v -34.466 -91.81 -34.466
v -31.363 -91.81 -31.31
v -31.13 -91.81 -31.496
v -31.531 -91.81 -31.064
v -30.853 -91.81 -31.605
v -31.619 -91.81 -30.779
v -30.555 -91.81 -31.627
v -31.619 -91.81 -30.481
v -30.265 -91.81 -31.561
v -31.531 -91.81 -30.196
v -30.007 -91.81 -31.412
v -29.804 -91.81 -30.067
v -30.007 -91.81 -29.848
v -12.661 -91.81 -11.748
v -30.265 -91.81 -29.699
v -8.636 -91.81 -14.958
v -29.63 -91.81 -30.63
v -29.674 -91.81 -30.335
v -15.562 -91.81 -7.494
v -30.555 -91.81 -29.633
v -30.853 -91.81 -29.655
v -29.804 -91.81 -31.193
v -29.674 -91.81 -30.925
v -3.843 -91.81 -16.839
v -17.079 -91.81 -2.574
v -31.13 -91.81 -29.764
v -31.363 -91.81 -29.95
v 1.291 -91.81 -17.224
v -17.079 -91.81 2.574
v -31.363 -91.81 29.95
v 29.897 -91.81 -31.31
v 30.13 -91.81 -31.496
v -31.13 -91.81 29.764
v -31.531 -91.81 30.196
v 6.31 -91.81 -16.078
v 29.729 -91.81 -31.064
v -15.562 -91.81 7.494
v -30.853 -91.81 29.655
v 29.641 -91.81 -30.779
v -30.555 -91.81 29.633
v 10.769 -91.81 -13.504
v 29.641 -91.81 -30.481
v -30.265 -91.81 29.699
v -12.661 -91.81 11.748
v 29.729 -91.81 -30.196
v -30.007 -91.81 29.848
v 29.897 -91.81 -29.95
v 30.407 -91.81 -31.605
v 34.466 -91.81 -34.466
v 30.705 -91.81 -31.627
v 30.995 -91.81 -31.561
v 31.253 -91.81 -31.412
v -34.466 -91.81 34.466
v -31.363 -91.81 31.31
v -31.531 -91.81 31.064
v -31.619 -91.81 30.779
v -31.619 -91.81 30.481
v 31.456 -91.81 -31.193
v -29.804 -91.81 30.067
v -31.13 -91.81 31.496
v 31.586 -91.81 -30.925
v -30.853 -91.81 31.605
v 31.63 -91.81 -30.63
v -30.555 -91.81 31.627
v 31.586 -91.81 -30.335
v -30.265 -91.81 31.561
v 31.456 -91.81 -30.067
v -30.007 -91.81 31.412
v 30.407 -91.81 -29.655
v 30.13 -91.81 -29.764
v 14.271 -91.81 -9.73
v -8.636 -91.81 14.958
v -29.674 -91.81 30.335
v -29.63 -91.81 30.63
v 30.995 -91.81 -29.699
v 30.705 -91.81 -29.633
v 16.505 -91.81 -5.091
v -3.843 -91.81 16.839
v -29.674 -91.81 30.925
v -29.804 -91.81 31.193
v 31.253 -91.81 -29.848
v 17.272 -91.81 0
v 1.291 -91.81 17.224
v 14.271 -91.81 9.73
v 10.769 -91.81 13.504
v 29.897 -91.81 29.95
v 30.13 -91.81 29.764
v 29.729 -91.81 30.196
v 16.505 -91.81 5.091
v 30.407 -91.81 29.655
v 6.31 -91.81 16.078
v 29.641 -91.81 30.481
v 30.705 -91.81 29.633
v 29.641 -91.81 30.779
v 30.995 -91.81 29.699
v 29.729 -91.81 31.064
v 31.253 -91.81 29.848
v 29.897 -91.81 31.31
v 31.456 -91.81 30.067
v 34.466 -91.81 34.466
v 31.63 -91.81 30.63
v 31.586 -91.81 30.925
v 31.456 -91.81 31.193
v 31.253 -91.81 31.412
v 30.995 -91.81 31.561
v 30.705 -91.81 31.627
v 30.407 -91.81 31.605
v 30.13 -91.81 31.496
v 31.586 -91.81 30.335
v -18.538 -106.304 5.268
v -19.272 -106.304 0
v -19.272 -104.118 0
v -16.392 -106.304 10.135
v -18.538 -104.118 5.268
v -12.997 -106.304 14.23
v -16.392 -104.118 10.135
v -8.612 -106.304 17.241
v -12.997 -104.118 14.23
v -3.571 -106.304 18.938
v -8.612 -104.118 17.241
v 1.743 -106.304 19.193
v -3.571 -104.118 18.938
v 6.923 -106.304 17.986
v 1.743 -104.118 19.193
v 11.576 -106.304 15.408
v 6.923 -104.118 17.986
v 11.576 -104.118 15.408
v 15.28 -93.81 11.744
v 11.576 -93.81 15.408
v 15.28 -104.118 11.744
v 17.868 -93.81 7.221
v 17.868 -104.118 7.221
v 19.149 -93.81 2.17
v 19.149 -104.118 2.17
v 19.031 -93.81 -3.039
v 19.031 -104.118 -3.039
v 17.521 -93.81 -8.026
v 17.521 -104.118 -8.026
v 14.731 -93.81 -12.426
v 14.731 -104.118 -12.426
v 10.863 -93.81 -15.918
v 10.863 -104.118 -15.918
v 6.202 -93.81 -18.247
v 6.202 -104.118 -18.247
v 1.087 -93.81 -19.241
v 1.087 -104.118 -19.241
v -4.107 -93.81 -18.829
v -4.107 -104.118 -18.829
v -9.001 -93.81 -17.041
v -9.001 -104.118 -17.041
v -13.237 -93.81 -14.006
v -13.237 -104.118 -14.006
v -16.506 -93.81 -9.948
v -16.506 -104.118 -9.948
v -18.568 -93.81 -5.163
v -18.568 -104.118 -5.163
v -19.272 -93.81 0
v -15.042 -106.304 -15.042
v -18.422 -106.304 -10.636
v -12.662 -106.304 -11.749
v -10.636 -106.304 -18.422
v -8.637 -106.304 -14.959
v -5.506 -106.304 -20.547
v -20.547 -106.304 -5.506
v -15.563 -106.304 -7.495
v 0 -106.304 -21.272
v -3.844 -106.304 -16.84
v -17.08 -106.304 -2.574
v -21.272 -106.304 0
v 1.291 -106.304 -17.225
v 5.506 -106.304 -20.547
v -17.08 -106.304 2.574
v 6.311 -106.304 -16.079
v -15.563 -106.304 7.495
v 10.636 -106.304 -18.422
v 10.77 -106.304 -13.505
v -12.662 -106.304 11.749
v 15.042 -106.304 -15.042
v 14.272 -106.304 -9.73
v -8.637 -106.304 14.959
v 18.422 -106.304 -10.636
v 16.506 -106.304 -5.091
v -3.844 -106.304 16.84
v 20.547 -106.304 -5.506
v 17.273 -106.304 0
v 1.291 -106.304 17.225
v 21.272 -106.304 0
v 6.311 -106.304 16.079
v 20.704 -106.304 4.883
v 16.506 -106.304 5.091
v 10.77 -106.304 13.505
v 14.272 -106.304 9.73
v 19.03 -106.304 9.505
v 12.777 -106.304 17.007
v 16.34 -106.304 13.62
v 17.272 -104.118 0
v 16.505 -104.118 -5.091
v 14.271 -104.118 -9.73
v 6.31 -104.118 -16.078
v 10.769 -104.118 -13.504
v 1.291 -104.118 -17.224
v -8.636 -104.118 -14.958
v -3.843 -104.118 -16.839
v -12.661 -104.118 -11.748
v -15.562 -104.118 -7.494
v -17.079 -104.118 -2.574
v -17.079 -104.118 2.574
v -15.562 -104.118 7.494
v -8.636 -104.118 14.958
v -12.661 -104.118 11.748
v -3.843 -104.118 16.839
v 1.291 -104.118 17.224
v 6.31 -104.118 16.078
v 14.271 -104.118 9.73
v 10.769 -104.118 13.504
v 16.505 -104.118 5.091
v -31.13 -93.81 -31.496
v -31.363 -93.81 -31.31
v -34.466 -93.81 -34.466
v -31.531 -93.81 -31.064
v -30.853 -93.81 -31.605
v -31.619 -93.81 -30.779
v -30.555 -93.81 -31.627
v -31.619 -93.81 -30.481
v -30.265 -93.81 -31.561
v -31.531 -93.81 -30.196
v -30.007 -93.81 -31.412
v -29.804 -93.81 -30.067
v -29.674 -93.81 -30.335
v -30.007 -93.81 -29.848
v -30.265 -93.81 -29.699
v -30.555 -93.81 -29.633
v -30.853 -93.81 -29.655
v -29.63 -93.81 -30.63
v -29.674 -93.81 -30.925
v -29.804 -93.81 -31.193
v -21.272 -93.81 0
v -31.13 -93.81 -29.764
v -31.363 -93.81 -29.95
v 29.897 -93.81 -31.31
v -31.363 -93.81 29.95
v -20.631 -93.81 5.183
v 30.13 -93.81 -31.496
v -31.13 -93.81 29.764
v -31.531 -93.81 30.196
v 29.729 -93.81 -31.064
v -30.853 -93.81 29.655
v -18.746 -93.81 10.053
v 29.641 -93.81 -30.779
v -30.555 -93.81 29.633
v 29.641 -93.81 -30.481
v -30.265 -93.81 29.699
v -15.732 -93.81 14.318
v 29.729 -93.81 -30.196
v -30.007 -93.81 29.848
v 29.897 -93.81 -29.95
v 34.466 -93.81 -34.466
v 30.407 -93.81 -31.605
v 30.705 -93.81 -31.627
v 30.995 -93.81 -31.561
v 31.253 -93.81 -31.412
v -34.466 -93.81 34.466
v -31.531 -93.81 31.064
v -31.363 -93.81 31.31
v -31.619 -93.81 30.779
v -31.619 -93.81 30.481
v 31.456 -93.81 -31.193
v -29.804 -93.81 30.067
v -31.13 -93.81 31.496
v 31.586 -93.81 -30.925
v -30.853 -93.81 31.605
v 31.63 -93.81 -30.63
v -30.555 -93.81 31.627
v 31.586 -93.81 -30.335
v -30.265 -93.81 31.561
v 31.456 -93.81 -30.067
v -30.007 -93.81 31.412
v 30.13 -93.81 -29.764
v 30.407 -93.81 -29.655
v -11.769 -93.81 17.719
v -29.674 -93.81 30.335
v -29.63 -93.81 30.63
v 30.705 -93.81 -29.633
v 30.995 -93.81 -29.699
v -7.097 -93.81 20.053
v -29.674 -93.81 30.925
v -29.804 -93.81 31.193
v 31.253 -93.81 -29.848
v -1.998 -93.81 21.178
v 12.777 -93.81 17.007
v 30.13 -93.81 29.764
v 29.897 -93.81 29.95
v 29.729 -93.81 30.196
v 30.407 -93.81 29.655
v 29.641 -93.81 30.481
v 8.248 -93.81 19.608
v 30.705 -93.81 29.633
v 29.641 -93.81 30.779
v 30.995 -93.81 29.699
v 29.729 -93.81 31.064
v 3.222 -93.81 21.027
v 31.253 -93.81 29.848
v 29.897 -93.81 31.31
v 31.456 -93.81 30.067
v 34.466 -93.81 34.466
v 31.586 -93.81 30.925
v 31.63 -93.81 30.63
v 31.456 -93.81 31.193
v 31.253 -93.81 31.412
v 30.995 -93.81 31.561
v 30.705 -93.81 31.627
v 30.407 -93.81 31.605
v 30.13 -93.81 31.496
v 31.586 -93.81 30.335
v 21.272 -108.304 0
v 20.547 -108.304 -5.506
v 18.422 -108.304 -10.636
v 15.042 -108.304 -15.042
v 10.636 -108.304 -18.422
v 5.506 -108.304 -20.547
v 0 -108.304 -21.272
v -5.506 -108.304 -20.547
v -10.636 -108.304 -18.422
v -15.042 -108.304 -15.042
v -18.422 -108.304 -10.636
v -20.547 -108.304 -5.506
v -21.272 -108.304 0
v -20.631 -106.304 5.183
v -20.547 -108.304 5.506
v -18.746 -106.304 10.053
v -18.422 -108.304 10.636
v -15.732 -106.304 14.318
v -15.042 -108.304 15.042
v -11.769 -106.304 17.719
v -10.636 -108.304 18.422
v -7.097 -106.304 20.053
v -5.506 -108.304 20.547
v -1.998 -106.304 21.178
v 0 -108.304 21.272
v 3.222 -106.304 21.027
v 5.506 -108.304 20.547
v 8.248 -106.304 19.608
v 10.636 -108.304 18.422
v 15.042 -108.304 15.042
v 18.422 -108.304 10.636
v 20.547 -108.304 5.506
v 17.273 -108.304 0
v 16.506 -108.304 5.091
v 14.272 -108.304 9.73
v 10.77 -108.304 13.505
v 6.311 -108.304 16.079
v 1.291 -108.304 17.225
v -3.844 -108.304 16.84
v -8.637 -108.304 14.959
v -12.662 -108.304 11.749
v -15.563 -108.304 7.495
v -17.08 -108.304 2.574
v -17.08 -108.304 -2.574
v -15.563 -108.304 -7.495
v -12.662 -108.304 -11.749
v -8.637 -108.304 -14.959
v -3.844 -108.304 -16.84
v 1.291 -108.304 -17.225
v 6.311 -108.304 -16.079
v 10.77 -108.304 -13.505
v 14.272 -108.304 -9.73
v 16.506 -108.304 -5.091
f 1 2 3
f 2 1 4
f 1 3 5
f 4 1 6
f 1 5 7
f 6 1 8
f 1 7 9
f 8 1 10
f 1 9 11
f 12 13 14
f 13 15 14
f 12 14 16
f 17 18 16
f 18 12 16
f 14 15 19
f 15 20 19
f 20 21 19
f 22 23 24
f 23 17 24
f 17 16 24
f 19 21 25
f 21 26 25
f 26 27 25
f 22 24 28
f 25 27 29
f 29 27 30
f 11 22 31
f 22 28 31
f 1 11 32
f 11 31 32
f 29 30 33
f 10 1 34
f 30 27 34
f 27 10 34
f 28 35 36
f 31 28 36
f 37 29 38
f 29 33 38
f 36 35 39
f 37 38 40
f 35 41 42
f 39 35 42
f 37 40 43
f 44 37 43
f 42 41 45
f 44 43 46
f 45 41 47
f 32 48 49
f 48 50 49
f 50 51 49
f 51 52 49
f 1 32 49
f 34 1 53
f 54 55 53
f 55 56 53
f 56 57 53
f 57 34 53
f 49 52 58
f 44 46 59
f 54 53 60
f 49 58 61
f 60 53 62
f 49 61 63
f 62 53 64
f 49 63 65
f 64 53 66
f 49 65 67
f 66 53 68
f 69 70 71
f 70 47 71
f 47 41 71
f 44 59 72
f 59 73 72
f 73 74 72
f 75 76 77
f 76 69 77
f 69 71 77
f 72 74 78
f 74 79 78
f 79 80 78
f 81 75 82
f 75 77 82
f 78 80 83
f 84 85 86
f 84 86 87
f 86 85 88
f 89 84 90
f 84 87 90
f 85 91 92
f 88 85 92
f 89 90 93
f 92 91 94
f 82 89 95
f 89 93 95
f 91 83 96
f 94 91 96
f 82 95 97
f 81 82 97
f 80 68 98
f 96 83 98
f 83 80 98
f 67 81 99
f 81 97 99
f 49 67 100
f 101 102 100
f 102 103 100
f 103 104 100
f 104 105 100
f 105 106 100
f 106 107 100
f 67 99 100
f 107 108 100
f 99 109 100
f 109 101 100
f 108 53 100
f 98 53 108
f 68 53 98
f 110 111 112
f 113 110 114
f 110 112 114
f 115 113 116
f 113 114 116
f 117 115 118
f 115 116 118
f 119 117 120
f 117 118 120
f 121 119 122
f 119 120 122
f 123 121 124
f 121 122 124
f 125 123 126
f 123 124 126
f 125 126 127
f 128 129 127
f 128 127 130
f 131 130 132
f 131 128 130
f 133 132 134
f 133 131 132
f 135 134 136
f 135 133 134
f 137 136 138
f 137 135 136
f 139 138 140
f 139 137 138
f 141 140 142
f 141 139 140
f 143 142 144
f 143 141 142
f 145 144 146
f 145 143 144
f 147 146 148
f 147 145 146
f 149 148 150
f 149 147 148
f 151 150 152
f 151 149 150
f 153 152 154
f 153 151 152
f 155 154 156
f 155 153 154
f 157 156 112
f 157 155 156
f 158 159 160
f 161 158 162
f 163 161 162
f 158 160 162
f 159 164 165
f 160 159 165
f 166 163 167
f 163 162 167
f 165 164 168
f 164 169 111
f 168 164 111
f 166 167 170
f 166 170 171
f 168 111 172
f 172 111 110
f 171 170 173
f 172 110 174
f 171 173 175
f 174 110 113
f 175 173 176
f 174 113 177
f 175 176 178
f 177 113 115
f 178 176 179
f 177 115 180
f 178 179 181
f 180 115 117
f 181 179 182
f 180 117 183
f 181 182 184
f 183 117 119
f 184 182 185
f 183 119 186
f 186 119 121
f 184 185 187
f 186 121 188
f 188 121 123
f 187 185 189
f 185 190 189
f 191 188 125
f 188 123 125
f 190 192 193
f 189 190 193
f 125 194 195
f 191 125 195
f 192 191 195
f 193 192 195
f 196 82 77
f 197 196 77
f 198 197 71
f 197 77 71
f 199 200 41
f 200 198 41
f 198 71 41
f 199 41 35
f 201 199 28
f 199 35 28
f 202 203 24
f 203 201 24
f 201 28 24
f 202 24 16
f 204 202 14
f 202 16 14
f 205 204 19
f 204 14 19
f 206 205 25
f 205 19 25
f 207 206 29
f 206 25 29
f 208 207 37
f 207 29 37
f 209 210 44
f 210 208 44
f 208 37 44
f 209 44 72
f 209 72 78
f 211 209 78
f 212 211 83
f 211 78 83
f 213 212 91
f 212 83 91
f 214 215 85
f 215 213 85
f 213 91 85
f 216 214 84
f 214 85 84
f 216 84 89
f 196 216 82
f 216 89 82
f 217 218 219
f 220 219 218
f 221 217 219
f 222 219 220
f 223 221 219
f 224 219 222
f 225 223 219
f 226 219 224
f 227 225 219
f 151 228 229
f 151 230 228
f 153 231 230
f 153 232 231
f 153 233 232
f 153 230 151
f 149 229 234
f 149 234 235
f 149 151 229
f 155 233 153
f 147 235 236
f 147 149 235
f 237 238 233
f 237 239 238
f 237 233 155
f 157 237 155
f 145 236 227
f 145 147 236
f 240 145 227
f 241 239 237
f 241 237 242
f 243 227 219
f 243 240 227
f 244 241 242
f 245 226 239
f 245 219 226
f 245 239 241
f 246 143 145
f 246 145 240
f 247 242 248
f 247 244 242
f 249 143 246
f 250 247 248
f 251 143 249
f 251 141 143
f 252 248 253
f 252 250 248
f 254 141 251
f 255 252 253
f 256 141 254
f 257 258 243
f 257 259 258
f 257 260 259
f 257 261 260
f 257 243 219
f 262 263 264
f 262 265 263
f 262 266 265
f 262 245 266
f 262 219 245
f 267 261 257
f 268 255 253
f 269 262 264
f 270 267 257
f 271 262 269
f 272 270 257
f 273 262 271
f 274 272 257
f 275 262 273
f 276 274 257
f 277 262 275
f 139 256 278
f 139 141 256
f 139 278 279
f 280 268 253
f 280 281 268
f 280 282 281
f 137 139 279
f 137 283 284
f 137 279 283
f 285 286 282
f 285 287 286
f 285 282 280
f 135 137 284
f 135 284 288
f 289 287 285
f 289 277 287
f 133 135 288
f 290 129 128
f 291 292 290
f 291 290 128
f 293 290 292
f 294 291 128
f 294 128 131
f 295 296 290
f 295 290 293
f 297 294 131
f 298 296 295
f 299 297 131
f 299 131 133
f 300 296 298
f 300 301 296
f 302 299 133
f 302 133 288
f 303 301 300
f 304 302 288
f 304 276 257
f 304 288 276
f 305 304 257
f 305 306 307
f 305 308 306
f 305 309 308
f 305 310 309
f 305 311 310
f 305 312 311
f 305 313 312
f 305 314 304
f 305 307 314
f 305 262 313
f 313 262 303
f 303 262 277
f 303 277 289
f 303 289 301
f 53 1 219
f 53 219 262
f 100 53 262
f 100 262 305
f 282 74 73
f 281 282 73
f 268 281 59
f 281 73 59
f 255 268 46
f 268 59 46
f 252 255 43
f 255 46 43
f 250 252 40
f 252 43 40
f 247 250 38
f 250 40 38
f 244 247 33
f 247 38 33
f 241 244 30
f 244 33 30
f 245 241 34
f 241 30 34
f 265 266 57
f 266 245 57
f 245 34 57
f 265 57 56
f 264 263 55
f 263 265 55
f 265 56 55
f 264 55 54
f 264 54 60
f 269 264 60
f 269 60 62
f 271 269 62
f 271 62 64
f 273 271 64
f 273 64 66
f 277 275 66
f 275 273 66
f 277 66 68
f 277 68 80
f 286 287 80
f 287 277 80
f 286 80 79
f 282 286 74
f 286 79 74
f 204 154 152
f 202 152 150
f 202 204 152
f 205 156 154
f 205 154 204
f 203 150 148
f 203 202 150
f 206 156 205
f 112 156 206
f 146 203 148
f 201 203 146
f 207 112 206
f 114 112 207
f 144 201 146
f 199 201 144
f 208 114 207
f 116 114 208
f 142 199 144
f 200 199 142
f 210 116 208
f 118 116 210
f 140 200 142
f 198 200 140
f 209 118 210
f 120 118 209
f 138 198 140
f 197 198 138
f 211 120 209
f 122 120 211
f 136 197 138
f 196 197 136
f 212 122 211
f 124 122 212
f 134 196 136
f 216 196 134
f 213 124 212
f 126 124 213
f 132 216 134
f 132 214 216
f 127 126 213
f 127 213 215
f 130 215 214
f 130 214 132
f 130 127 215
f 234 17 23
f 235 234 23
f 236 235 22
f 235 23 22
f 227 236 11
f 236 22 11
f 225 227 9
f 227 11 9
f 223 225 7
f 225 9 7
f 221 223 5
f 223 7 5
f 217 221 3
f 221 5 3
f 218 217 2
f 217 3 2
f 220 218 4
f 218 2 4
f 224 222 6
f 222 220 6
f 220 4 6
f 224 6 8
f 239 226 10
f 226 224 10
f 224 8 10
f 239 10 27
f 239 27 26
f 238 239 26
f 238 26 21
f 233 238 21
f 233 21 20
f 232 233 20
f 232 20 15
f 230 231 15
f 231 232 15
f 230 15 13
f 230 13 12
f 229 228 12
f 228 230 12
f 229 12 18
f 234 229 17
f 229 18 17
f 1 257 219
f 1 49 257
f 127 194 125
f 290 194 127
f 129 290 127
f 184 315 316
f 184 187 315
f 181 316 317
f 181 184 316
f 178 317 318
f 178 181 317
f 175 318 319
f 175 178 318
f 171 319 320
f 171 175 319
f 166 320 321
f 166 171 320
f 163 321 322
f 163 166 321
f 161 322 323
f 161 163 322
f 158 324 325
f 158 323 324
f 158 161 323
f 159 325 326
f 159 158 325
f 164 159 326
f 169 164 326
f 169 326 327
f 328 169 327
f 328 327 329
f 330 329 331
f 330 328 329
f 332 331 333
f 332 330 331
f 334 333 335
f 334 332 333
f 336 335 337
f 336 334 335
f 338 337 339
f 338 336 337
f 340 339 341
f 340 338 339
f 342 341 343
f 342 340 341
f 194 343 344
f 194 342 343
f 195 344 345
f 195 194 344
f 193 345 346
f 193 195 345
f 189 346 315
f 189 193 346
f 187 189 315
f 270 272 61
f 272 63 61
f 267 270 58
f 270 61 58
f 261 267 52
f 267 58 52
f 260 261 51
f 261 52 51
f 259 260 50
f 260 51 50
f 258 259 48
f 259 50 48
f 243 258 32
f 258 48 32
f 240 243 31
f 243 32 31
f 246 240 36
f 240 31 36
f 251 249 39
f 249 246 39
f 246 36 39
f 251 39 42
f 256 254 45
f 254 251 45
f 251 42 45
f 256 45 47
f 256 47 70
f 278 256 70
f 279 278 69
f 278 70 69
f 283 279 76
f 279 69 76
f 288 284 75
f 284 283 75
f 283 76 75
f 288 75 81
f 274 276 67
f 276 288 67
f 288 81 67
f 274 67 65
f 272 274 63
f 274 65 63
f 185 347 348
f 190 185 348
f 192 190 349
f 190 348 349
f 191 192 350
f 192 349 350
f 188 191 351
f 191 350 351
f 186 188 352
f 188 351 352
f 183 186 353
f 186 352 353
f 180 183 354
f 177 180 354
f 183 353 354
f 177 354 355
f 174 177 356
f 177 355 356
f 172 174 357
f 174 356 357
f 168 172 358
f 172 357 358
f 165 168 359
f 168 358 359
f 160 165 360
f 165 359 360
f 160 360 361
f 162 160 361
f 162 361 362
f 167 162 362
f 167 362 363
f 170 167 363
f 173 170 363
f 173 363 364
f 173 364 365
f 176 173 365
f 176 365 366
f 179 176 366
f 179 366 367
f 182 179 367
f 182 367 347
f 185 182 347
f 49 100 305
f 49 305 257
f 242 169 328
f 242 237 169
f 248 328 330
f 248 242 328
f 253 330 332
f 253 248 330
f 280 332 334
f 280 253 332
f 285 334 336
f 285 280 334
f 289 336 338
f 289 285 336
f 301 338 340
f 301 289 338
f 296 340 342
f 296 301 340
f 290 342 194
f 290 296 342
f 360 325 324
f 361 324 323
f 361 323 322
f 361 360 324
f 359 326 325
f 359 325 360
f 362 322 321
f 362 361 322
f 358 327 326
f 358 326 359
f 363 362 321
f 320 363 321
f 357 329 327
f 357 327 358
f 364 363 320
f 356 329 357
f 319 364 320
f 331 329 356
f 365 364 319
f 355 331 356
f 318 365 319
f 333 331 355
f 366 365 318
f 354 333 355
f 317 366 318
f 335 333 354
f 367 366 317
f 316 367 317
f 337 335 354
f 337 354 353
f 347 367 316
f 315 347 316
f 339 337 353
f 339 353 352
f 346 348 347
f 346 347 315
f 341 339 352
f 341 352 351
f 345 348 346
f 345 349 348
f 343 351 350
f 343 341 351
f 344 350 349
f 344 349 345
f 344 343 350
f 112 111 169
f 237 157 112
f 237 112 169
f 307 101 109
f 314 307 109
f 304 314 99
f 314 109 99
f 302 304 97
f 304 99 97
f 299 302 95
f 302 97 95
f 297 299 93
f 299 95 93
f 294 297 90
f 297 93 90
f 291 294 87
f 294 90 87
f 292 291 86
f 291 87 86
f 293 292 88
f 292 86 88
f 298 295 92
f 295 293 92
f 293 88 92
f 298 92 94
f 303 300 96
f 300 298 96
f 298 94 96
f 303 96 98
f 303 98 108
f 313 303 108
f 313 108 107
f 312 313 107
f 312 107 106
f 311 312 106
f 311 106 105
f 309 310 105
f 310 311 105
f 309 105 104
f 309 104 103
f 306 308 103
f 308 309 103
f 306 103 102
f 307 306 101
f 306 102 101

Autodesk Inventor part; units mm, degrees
ref_plane "Work Plane1" through (-148.5253, -91.81, -70.5943) normal (0, -1, 0) x (1, 0, 0)
sketch "Sketch6" plane through (-148.5253, -91.81, -70.5943) normal (0, -1, 0) x (1, 0, 0)
  line L0 (182.9917, 36.1279) -> (114.0589, 36.1279) projected
  line L1 (182.9917, 105.0607) -> (182.9917, 36.1279) projected
  line L2 (114.0589, 36.1279) -> (114.0589, 105.0607) projected
  line L3 (114.0589, 105.0607) -> (182.9917, 105.0607) projected
  circle A0 centre (179.1553, 101.2243) radius 1 projected
  circle A1 centre (117.8953, 101.2243) radius 1 projected
  circle A2 centre (117.8953, 39.9643) radius 1 projected
  circle A3 centre (179.1553, 39.9643) radius 1 projected
  point P0 (148.5253, 70.5943)
extrude "Extrusion1" add sketch "Sketch6" along normal blind 2
ref_plane "Work Plane3" through (-148.5253, -93.81, -70.5943) normal (0, -1, 0) x (1, 0, 0)
sketch "Sketch7" plane through (-148.5253, -93.81, -70.5943) normal (0, -1, 0) x (1, 0, 0)
  circle A0 centre (148.5253, 70.5943) radius 17.272
  dimension "d3" = 34.544
extrude "Extrusion2" cut sketch "Sketch7" against normal blind 2
ref_plane "Work Plane2" through (-148.5253, -93.81, -70.5943) normal (0, -1, 0) x (1, 0, 0)
sketch "Sketch8" plane through (-148.5253, -93.81, -70.5943) normal (0, -1, 0) x (1, 0, 0)
  circle A0 centre (148.5253, 70.5943) radius 19.272
  circle A1 centre (148.5253, 70.5943) radius 17.272 projected
  dimension "d6" = 2
extrude "Extrusion3" add sketch "Sketch8" along normal blind 10.3076
sketch "Sketch9" plane through (-148.5253, -93.81, -70.5943) normal (0, -1, 0) x (1, 0, 0)
  arc A0 (160.2004, 63.2971) -> (137.9644, 32.6515) centre (152.0021, 45.8559) ccw projected
  circle A1 centre (148.5253, 70.5943) radius 19.272 projected
  arc A2 (161.3025, 87.6014) -> (127.2533, 70.5943) centre (148.5253, 70.5943) ccw
  line L0 (129.2533, 70.5943) -> (127.2533, 70.5943)
  line L1 (161.3025, 87.6014) -> (160.1012, 86.0024)
  dimension "d9" = 2
  dimension "d10" = 1.599
ref_plane "Work Plane4" through (79.84, -63.33, -9.91) normal (-1, 0, 0) x (0, 1, 0)
sketch "Sketch10" plane through (79.84, -63.33, -9.91) normal (-1, 0, 0) x (0, 1, 0)
  line L0 (-30.48, -44.3764) -> (-30.48, 24.5564) construction
  line L1 (-40.7876, 9.362) -> (-40.7876, -29.182) construction
  line L2 (-42.7826, 28.0328) -> (-42.7826, -4.4435) construction
  point P0 (63.33, -9.91)
  dimension "d11" = 10.3076
  dimension "d12" = 12.3026
extrude "Extrusion4" add sketch "Sketch9" along normal blind 12.4936 contours A1 L0 A2 L1
sketch "Sketch11" plane through (-148.5253, -106.3036, -70.5943) normal (0, -1, 0) x (1, 0, 0)
  arc A0 (236.18, 74.3245) -> (238.4751, 66.3206) centre (237.3276, 70.3226) ccw construction
  line L0 (236.18, 74.3245) -> (189.5181, 60.9444) construction
  arc A1 (160.2004, 63.2971) -> (189.5181, 60.9444) centre (177.9908, 101.1449) ccw construction
  arc A2 (160.2004, 63.2971) -> (137.9644, 32.6515) centre (152.0021, 45.8559) ccw construction
  line L1 (136.5076, 31.2812) -> (137.9644, 32.6515) construction
  arc A3 (136.5076, 31.2812) -> (169.8778, 34.3252) centre (152.0021, 45.8559) ccw construction
  arc A4 (172.0656, 37.3886) -> (169.8778, 34.3252) centre (203.3405, 12.74) ccw construction
  line L2 (170.4948, 38.6266) -> (172.0656, 37.3886) construction
  arc A5 (191.8132, 52.9405) -> (170.4948, 38.6266) centre (203.3405, 12.74) ccw construction
  line L3 (191.8132, 52.9405) -> (238.4751, 66.3206) construction
  line L4 (129.2533, 70.5943) -> (127.2533, 70.5943) construction
  line L5 (129.2533, 70.5943) -> (165.4777, 70.5943) construction
  circle A6 centre (148.5253, 70.5943) radius 17.272 construction
  line L6 (148.5253, 87.8663) -> (148.5253, 53.3223) construction
  circle A7 centre (148.5253, 70.5943) radius 17.272 construction
  circle A8 centre (148.5253, 70.5943) radius 19.272 construction
  circle A9 centre (148.5253, 70.5943) radius 21.272
  dimension "d15" = 42.544
extrude "Extrusion5" add sketch "Sketch11" along normal blind 2
sketch "Sketch12" plane through (0, -108.3036, 0) normal (0, -1, 0) x (1, 0, 0)
  circle A0 centre (0, 0) radius 17.2734 projected
extrude "Extrusion6" cut sketch "Sketch12" against normal blind 2
properties part number "TrapAdapter" material "ABS Plastic"
